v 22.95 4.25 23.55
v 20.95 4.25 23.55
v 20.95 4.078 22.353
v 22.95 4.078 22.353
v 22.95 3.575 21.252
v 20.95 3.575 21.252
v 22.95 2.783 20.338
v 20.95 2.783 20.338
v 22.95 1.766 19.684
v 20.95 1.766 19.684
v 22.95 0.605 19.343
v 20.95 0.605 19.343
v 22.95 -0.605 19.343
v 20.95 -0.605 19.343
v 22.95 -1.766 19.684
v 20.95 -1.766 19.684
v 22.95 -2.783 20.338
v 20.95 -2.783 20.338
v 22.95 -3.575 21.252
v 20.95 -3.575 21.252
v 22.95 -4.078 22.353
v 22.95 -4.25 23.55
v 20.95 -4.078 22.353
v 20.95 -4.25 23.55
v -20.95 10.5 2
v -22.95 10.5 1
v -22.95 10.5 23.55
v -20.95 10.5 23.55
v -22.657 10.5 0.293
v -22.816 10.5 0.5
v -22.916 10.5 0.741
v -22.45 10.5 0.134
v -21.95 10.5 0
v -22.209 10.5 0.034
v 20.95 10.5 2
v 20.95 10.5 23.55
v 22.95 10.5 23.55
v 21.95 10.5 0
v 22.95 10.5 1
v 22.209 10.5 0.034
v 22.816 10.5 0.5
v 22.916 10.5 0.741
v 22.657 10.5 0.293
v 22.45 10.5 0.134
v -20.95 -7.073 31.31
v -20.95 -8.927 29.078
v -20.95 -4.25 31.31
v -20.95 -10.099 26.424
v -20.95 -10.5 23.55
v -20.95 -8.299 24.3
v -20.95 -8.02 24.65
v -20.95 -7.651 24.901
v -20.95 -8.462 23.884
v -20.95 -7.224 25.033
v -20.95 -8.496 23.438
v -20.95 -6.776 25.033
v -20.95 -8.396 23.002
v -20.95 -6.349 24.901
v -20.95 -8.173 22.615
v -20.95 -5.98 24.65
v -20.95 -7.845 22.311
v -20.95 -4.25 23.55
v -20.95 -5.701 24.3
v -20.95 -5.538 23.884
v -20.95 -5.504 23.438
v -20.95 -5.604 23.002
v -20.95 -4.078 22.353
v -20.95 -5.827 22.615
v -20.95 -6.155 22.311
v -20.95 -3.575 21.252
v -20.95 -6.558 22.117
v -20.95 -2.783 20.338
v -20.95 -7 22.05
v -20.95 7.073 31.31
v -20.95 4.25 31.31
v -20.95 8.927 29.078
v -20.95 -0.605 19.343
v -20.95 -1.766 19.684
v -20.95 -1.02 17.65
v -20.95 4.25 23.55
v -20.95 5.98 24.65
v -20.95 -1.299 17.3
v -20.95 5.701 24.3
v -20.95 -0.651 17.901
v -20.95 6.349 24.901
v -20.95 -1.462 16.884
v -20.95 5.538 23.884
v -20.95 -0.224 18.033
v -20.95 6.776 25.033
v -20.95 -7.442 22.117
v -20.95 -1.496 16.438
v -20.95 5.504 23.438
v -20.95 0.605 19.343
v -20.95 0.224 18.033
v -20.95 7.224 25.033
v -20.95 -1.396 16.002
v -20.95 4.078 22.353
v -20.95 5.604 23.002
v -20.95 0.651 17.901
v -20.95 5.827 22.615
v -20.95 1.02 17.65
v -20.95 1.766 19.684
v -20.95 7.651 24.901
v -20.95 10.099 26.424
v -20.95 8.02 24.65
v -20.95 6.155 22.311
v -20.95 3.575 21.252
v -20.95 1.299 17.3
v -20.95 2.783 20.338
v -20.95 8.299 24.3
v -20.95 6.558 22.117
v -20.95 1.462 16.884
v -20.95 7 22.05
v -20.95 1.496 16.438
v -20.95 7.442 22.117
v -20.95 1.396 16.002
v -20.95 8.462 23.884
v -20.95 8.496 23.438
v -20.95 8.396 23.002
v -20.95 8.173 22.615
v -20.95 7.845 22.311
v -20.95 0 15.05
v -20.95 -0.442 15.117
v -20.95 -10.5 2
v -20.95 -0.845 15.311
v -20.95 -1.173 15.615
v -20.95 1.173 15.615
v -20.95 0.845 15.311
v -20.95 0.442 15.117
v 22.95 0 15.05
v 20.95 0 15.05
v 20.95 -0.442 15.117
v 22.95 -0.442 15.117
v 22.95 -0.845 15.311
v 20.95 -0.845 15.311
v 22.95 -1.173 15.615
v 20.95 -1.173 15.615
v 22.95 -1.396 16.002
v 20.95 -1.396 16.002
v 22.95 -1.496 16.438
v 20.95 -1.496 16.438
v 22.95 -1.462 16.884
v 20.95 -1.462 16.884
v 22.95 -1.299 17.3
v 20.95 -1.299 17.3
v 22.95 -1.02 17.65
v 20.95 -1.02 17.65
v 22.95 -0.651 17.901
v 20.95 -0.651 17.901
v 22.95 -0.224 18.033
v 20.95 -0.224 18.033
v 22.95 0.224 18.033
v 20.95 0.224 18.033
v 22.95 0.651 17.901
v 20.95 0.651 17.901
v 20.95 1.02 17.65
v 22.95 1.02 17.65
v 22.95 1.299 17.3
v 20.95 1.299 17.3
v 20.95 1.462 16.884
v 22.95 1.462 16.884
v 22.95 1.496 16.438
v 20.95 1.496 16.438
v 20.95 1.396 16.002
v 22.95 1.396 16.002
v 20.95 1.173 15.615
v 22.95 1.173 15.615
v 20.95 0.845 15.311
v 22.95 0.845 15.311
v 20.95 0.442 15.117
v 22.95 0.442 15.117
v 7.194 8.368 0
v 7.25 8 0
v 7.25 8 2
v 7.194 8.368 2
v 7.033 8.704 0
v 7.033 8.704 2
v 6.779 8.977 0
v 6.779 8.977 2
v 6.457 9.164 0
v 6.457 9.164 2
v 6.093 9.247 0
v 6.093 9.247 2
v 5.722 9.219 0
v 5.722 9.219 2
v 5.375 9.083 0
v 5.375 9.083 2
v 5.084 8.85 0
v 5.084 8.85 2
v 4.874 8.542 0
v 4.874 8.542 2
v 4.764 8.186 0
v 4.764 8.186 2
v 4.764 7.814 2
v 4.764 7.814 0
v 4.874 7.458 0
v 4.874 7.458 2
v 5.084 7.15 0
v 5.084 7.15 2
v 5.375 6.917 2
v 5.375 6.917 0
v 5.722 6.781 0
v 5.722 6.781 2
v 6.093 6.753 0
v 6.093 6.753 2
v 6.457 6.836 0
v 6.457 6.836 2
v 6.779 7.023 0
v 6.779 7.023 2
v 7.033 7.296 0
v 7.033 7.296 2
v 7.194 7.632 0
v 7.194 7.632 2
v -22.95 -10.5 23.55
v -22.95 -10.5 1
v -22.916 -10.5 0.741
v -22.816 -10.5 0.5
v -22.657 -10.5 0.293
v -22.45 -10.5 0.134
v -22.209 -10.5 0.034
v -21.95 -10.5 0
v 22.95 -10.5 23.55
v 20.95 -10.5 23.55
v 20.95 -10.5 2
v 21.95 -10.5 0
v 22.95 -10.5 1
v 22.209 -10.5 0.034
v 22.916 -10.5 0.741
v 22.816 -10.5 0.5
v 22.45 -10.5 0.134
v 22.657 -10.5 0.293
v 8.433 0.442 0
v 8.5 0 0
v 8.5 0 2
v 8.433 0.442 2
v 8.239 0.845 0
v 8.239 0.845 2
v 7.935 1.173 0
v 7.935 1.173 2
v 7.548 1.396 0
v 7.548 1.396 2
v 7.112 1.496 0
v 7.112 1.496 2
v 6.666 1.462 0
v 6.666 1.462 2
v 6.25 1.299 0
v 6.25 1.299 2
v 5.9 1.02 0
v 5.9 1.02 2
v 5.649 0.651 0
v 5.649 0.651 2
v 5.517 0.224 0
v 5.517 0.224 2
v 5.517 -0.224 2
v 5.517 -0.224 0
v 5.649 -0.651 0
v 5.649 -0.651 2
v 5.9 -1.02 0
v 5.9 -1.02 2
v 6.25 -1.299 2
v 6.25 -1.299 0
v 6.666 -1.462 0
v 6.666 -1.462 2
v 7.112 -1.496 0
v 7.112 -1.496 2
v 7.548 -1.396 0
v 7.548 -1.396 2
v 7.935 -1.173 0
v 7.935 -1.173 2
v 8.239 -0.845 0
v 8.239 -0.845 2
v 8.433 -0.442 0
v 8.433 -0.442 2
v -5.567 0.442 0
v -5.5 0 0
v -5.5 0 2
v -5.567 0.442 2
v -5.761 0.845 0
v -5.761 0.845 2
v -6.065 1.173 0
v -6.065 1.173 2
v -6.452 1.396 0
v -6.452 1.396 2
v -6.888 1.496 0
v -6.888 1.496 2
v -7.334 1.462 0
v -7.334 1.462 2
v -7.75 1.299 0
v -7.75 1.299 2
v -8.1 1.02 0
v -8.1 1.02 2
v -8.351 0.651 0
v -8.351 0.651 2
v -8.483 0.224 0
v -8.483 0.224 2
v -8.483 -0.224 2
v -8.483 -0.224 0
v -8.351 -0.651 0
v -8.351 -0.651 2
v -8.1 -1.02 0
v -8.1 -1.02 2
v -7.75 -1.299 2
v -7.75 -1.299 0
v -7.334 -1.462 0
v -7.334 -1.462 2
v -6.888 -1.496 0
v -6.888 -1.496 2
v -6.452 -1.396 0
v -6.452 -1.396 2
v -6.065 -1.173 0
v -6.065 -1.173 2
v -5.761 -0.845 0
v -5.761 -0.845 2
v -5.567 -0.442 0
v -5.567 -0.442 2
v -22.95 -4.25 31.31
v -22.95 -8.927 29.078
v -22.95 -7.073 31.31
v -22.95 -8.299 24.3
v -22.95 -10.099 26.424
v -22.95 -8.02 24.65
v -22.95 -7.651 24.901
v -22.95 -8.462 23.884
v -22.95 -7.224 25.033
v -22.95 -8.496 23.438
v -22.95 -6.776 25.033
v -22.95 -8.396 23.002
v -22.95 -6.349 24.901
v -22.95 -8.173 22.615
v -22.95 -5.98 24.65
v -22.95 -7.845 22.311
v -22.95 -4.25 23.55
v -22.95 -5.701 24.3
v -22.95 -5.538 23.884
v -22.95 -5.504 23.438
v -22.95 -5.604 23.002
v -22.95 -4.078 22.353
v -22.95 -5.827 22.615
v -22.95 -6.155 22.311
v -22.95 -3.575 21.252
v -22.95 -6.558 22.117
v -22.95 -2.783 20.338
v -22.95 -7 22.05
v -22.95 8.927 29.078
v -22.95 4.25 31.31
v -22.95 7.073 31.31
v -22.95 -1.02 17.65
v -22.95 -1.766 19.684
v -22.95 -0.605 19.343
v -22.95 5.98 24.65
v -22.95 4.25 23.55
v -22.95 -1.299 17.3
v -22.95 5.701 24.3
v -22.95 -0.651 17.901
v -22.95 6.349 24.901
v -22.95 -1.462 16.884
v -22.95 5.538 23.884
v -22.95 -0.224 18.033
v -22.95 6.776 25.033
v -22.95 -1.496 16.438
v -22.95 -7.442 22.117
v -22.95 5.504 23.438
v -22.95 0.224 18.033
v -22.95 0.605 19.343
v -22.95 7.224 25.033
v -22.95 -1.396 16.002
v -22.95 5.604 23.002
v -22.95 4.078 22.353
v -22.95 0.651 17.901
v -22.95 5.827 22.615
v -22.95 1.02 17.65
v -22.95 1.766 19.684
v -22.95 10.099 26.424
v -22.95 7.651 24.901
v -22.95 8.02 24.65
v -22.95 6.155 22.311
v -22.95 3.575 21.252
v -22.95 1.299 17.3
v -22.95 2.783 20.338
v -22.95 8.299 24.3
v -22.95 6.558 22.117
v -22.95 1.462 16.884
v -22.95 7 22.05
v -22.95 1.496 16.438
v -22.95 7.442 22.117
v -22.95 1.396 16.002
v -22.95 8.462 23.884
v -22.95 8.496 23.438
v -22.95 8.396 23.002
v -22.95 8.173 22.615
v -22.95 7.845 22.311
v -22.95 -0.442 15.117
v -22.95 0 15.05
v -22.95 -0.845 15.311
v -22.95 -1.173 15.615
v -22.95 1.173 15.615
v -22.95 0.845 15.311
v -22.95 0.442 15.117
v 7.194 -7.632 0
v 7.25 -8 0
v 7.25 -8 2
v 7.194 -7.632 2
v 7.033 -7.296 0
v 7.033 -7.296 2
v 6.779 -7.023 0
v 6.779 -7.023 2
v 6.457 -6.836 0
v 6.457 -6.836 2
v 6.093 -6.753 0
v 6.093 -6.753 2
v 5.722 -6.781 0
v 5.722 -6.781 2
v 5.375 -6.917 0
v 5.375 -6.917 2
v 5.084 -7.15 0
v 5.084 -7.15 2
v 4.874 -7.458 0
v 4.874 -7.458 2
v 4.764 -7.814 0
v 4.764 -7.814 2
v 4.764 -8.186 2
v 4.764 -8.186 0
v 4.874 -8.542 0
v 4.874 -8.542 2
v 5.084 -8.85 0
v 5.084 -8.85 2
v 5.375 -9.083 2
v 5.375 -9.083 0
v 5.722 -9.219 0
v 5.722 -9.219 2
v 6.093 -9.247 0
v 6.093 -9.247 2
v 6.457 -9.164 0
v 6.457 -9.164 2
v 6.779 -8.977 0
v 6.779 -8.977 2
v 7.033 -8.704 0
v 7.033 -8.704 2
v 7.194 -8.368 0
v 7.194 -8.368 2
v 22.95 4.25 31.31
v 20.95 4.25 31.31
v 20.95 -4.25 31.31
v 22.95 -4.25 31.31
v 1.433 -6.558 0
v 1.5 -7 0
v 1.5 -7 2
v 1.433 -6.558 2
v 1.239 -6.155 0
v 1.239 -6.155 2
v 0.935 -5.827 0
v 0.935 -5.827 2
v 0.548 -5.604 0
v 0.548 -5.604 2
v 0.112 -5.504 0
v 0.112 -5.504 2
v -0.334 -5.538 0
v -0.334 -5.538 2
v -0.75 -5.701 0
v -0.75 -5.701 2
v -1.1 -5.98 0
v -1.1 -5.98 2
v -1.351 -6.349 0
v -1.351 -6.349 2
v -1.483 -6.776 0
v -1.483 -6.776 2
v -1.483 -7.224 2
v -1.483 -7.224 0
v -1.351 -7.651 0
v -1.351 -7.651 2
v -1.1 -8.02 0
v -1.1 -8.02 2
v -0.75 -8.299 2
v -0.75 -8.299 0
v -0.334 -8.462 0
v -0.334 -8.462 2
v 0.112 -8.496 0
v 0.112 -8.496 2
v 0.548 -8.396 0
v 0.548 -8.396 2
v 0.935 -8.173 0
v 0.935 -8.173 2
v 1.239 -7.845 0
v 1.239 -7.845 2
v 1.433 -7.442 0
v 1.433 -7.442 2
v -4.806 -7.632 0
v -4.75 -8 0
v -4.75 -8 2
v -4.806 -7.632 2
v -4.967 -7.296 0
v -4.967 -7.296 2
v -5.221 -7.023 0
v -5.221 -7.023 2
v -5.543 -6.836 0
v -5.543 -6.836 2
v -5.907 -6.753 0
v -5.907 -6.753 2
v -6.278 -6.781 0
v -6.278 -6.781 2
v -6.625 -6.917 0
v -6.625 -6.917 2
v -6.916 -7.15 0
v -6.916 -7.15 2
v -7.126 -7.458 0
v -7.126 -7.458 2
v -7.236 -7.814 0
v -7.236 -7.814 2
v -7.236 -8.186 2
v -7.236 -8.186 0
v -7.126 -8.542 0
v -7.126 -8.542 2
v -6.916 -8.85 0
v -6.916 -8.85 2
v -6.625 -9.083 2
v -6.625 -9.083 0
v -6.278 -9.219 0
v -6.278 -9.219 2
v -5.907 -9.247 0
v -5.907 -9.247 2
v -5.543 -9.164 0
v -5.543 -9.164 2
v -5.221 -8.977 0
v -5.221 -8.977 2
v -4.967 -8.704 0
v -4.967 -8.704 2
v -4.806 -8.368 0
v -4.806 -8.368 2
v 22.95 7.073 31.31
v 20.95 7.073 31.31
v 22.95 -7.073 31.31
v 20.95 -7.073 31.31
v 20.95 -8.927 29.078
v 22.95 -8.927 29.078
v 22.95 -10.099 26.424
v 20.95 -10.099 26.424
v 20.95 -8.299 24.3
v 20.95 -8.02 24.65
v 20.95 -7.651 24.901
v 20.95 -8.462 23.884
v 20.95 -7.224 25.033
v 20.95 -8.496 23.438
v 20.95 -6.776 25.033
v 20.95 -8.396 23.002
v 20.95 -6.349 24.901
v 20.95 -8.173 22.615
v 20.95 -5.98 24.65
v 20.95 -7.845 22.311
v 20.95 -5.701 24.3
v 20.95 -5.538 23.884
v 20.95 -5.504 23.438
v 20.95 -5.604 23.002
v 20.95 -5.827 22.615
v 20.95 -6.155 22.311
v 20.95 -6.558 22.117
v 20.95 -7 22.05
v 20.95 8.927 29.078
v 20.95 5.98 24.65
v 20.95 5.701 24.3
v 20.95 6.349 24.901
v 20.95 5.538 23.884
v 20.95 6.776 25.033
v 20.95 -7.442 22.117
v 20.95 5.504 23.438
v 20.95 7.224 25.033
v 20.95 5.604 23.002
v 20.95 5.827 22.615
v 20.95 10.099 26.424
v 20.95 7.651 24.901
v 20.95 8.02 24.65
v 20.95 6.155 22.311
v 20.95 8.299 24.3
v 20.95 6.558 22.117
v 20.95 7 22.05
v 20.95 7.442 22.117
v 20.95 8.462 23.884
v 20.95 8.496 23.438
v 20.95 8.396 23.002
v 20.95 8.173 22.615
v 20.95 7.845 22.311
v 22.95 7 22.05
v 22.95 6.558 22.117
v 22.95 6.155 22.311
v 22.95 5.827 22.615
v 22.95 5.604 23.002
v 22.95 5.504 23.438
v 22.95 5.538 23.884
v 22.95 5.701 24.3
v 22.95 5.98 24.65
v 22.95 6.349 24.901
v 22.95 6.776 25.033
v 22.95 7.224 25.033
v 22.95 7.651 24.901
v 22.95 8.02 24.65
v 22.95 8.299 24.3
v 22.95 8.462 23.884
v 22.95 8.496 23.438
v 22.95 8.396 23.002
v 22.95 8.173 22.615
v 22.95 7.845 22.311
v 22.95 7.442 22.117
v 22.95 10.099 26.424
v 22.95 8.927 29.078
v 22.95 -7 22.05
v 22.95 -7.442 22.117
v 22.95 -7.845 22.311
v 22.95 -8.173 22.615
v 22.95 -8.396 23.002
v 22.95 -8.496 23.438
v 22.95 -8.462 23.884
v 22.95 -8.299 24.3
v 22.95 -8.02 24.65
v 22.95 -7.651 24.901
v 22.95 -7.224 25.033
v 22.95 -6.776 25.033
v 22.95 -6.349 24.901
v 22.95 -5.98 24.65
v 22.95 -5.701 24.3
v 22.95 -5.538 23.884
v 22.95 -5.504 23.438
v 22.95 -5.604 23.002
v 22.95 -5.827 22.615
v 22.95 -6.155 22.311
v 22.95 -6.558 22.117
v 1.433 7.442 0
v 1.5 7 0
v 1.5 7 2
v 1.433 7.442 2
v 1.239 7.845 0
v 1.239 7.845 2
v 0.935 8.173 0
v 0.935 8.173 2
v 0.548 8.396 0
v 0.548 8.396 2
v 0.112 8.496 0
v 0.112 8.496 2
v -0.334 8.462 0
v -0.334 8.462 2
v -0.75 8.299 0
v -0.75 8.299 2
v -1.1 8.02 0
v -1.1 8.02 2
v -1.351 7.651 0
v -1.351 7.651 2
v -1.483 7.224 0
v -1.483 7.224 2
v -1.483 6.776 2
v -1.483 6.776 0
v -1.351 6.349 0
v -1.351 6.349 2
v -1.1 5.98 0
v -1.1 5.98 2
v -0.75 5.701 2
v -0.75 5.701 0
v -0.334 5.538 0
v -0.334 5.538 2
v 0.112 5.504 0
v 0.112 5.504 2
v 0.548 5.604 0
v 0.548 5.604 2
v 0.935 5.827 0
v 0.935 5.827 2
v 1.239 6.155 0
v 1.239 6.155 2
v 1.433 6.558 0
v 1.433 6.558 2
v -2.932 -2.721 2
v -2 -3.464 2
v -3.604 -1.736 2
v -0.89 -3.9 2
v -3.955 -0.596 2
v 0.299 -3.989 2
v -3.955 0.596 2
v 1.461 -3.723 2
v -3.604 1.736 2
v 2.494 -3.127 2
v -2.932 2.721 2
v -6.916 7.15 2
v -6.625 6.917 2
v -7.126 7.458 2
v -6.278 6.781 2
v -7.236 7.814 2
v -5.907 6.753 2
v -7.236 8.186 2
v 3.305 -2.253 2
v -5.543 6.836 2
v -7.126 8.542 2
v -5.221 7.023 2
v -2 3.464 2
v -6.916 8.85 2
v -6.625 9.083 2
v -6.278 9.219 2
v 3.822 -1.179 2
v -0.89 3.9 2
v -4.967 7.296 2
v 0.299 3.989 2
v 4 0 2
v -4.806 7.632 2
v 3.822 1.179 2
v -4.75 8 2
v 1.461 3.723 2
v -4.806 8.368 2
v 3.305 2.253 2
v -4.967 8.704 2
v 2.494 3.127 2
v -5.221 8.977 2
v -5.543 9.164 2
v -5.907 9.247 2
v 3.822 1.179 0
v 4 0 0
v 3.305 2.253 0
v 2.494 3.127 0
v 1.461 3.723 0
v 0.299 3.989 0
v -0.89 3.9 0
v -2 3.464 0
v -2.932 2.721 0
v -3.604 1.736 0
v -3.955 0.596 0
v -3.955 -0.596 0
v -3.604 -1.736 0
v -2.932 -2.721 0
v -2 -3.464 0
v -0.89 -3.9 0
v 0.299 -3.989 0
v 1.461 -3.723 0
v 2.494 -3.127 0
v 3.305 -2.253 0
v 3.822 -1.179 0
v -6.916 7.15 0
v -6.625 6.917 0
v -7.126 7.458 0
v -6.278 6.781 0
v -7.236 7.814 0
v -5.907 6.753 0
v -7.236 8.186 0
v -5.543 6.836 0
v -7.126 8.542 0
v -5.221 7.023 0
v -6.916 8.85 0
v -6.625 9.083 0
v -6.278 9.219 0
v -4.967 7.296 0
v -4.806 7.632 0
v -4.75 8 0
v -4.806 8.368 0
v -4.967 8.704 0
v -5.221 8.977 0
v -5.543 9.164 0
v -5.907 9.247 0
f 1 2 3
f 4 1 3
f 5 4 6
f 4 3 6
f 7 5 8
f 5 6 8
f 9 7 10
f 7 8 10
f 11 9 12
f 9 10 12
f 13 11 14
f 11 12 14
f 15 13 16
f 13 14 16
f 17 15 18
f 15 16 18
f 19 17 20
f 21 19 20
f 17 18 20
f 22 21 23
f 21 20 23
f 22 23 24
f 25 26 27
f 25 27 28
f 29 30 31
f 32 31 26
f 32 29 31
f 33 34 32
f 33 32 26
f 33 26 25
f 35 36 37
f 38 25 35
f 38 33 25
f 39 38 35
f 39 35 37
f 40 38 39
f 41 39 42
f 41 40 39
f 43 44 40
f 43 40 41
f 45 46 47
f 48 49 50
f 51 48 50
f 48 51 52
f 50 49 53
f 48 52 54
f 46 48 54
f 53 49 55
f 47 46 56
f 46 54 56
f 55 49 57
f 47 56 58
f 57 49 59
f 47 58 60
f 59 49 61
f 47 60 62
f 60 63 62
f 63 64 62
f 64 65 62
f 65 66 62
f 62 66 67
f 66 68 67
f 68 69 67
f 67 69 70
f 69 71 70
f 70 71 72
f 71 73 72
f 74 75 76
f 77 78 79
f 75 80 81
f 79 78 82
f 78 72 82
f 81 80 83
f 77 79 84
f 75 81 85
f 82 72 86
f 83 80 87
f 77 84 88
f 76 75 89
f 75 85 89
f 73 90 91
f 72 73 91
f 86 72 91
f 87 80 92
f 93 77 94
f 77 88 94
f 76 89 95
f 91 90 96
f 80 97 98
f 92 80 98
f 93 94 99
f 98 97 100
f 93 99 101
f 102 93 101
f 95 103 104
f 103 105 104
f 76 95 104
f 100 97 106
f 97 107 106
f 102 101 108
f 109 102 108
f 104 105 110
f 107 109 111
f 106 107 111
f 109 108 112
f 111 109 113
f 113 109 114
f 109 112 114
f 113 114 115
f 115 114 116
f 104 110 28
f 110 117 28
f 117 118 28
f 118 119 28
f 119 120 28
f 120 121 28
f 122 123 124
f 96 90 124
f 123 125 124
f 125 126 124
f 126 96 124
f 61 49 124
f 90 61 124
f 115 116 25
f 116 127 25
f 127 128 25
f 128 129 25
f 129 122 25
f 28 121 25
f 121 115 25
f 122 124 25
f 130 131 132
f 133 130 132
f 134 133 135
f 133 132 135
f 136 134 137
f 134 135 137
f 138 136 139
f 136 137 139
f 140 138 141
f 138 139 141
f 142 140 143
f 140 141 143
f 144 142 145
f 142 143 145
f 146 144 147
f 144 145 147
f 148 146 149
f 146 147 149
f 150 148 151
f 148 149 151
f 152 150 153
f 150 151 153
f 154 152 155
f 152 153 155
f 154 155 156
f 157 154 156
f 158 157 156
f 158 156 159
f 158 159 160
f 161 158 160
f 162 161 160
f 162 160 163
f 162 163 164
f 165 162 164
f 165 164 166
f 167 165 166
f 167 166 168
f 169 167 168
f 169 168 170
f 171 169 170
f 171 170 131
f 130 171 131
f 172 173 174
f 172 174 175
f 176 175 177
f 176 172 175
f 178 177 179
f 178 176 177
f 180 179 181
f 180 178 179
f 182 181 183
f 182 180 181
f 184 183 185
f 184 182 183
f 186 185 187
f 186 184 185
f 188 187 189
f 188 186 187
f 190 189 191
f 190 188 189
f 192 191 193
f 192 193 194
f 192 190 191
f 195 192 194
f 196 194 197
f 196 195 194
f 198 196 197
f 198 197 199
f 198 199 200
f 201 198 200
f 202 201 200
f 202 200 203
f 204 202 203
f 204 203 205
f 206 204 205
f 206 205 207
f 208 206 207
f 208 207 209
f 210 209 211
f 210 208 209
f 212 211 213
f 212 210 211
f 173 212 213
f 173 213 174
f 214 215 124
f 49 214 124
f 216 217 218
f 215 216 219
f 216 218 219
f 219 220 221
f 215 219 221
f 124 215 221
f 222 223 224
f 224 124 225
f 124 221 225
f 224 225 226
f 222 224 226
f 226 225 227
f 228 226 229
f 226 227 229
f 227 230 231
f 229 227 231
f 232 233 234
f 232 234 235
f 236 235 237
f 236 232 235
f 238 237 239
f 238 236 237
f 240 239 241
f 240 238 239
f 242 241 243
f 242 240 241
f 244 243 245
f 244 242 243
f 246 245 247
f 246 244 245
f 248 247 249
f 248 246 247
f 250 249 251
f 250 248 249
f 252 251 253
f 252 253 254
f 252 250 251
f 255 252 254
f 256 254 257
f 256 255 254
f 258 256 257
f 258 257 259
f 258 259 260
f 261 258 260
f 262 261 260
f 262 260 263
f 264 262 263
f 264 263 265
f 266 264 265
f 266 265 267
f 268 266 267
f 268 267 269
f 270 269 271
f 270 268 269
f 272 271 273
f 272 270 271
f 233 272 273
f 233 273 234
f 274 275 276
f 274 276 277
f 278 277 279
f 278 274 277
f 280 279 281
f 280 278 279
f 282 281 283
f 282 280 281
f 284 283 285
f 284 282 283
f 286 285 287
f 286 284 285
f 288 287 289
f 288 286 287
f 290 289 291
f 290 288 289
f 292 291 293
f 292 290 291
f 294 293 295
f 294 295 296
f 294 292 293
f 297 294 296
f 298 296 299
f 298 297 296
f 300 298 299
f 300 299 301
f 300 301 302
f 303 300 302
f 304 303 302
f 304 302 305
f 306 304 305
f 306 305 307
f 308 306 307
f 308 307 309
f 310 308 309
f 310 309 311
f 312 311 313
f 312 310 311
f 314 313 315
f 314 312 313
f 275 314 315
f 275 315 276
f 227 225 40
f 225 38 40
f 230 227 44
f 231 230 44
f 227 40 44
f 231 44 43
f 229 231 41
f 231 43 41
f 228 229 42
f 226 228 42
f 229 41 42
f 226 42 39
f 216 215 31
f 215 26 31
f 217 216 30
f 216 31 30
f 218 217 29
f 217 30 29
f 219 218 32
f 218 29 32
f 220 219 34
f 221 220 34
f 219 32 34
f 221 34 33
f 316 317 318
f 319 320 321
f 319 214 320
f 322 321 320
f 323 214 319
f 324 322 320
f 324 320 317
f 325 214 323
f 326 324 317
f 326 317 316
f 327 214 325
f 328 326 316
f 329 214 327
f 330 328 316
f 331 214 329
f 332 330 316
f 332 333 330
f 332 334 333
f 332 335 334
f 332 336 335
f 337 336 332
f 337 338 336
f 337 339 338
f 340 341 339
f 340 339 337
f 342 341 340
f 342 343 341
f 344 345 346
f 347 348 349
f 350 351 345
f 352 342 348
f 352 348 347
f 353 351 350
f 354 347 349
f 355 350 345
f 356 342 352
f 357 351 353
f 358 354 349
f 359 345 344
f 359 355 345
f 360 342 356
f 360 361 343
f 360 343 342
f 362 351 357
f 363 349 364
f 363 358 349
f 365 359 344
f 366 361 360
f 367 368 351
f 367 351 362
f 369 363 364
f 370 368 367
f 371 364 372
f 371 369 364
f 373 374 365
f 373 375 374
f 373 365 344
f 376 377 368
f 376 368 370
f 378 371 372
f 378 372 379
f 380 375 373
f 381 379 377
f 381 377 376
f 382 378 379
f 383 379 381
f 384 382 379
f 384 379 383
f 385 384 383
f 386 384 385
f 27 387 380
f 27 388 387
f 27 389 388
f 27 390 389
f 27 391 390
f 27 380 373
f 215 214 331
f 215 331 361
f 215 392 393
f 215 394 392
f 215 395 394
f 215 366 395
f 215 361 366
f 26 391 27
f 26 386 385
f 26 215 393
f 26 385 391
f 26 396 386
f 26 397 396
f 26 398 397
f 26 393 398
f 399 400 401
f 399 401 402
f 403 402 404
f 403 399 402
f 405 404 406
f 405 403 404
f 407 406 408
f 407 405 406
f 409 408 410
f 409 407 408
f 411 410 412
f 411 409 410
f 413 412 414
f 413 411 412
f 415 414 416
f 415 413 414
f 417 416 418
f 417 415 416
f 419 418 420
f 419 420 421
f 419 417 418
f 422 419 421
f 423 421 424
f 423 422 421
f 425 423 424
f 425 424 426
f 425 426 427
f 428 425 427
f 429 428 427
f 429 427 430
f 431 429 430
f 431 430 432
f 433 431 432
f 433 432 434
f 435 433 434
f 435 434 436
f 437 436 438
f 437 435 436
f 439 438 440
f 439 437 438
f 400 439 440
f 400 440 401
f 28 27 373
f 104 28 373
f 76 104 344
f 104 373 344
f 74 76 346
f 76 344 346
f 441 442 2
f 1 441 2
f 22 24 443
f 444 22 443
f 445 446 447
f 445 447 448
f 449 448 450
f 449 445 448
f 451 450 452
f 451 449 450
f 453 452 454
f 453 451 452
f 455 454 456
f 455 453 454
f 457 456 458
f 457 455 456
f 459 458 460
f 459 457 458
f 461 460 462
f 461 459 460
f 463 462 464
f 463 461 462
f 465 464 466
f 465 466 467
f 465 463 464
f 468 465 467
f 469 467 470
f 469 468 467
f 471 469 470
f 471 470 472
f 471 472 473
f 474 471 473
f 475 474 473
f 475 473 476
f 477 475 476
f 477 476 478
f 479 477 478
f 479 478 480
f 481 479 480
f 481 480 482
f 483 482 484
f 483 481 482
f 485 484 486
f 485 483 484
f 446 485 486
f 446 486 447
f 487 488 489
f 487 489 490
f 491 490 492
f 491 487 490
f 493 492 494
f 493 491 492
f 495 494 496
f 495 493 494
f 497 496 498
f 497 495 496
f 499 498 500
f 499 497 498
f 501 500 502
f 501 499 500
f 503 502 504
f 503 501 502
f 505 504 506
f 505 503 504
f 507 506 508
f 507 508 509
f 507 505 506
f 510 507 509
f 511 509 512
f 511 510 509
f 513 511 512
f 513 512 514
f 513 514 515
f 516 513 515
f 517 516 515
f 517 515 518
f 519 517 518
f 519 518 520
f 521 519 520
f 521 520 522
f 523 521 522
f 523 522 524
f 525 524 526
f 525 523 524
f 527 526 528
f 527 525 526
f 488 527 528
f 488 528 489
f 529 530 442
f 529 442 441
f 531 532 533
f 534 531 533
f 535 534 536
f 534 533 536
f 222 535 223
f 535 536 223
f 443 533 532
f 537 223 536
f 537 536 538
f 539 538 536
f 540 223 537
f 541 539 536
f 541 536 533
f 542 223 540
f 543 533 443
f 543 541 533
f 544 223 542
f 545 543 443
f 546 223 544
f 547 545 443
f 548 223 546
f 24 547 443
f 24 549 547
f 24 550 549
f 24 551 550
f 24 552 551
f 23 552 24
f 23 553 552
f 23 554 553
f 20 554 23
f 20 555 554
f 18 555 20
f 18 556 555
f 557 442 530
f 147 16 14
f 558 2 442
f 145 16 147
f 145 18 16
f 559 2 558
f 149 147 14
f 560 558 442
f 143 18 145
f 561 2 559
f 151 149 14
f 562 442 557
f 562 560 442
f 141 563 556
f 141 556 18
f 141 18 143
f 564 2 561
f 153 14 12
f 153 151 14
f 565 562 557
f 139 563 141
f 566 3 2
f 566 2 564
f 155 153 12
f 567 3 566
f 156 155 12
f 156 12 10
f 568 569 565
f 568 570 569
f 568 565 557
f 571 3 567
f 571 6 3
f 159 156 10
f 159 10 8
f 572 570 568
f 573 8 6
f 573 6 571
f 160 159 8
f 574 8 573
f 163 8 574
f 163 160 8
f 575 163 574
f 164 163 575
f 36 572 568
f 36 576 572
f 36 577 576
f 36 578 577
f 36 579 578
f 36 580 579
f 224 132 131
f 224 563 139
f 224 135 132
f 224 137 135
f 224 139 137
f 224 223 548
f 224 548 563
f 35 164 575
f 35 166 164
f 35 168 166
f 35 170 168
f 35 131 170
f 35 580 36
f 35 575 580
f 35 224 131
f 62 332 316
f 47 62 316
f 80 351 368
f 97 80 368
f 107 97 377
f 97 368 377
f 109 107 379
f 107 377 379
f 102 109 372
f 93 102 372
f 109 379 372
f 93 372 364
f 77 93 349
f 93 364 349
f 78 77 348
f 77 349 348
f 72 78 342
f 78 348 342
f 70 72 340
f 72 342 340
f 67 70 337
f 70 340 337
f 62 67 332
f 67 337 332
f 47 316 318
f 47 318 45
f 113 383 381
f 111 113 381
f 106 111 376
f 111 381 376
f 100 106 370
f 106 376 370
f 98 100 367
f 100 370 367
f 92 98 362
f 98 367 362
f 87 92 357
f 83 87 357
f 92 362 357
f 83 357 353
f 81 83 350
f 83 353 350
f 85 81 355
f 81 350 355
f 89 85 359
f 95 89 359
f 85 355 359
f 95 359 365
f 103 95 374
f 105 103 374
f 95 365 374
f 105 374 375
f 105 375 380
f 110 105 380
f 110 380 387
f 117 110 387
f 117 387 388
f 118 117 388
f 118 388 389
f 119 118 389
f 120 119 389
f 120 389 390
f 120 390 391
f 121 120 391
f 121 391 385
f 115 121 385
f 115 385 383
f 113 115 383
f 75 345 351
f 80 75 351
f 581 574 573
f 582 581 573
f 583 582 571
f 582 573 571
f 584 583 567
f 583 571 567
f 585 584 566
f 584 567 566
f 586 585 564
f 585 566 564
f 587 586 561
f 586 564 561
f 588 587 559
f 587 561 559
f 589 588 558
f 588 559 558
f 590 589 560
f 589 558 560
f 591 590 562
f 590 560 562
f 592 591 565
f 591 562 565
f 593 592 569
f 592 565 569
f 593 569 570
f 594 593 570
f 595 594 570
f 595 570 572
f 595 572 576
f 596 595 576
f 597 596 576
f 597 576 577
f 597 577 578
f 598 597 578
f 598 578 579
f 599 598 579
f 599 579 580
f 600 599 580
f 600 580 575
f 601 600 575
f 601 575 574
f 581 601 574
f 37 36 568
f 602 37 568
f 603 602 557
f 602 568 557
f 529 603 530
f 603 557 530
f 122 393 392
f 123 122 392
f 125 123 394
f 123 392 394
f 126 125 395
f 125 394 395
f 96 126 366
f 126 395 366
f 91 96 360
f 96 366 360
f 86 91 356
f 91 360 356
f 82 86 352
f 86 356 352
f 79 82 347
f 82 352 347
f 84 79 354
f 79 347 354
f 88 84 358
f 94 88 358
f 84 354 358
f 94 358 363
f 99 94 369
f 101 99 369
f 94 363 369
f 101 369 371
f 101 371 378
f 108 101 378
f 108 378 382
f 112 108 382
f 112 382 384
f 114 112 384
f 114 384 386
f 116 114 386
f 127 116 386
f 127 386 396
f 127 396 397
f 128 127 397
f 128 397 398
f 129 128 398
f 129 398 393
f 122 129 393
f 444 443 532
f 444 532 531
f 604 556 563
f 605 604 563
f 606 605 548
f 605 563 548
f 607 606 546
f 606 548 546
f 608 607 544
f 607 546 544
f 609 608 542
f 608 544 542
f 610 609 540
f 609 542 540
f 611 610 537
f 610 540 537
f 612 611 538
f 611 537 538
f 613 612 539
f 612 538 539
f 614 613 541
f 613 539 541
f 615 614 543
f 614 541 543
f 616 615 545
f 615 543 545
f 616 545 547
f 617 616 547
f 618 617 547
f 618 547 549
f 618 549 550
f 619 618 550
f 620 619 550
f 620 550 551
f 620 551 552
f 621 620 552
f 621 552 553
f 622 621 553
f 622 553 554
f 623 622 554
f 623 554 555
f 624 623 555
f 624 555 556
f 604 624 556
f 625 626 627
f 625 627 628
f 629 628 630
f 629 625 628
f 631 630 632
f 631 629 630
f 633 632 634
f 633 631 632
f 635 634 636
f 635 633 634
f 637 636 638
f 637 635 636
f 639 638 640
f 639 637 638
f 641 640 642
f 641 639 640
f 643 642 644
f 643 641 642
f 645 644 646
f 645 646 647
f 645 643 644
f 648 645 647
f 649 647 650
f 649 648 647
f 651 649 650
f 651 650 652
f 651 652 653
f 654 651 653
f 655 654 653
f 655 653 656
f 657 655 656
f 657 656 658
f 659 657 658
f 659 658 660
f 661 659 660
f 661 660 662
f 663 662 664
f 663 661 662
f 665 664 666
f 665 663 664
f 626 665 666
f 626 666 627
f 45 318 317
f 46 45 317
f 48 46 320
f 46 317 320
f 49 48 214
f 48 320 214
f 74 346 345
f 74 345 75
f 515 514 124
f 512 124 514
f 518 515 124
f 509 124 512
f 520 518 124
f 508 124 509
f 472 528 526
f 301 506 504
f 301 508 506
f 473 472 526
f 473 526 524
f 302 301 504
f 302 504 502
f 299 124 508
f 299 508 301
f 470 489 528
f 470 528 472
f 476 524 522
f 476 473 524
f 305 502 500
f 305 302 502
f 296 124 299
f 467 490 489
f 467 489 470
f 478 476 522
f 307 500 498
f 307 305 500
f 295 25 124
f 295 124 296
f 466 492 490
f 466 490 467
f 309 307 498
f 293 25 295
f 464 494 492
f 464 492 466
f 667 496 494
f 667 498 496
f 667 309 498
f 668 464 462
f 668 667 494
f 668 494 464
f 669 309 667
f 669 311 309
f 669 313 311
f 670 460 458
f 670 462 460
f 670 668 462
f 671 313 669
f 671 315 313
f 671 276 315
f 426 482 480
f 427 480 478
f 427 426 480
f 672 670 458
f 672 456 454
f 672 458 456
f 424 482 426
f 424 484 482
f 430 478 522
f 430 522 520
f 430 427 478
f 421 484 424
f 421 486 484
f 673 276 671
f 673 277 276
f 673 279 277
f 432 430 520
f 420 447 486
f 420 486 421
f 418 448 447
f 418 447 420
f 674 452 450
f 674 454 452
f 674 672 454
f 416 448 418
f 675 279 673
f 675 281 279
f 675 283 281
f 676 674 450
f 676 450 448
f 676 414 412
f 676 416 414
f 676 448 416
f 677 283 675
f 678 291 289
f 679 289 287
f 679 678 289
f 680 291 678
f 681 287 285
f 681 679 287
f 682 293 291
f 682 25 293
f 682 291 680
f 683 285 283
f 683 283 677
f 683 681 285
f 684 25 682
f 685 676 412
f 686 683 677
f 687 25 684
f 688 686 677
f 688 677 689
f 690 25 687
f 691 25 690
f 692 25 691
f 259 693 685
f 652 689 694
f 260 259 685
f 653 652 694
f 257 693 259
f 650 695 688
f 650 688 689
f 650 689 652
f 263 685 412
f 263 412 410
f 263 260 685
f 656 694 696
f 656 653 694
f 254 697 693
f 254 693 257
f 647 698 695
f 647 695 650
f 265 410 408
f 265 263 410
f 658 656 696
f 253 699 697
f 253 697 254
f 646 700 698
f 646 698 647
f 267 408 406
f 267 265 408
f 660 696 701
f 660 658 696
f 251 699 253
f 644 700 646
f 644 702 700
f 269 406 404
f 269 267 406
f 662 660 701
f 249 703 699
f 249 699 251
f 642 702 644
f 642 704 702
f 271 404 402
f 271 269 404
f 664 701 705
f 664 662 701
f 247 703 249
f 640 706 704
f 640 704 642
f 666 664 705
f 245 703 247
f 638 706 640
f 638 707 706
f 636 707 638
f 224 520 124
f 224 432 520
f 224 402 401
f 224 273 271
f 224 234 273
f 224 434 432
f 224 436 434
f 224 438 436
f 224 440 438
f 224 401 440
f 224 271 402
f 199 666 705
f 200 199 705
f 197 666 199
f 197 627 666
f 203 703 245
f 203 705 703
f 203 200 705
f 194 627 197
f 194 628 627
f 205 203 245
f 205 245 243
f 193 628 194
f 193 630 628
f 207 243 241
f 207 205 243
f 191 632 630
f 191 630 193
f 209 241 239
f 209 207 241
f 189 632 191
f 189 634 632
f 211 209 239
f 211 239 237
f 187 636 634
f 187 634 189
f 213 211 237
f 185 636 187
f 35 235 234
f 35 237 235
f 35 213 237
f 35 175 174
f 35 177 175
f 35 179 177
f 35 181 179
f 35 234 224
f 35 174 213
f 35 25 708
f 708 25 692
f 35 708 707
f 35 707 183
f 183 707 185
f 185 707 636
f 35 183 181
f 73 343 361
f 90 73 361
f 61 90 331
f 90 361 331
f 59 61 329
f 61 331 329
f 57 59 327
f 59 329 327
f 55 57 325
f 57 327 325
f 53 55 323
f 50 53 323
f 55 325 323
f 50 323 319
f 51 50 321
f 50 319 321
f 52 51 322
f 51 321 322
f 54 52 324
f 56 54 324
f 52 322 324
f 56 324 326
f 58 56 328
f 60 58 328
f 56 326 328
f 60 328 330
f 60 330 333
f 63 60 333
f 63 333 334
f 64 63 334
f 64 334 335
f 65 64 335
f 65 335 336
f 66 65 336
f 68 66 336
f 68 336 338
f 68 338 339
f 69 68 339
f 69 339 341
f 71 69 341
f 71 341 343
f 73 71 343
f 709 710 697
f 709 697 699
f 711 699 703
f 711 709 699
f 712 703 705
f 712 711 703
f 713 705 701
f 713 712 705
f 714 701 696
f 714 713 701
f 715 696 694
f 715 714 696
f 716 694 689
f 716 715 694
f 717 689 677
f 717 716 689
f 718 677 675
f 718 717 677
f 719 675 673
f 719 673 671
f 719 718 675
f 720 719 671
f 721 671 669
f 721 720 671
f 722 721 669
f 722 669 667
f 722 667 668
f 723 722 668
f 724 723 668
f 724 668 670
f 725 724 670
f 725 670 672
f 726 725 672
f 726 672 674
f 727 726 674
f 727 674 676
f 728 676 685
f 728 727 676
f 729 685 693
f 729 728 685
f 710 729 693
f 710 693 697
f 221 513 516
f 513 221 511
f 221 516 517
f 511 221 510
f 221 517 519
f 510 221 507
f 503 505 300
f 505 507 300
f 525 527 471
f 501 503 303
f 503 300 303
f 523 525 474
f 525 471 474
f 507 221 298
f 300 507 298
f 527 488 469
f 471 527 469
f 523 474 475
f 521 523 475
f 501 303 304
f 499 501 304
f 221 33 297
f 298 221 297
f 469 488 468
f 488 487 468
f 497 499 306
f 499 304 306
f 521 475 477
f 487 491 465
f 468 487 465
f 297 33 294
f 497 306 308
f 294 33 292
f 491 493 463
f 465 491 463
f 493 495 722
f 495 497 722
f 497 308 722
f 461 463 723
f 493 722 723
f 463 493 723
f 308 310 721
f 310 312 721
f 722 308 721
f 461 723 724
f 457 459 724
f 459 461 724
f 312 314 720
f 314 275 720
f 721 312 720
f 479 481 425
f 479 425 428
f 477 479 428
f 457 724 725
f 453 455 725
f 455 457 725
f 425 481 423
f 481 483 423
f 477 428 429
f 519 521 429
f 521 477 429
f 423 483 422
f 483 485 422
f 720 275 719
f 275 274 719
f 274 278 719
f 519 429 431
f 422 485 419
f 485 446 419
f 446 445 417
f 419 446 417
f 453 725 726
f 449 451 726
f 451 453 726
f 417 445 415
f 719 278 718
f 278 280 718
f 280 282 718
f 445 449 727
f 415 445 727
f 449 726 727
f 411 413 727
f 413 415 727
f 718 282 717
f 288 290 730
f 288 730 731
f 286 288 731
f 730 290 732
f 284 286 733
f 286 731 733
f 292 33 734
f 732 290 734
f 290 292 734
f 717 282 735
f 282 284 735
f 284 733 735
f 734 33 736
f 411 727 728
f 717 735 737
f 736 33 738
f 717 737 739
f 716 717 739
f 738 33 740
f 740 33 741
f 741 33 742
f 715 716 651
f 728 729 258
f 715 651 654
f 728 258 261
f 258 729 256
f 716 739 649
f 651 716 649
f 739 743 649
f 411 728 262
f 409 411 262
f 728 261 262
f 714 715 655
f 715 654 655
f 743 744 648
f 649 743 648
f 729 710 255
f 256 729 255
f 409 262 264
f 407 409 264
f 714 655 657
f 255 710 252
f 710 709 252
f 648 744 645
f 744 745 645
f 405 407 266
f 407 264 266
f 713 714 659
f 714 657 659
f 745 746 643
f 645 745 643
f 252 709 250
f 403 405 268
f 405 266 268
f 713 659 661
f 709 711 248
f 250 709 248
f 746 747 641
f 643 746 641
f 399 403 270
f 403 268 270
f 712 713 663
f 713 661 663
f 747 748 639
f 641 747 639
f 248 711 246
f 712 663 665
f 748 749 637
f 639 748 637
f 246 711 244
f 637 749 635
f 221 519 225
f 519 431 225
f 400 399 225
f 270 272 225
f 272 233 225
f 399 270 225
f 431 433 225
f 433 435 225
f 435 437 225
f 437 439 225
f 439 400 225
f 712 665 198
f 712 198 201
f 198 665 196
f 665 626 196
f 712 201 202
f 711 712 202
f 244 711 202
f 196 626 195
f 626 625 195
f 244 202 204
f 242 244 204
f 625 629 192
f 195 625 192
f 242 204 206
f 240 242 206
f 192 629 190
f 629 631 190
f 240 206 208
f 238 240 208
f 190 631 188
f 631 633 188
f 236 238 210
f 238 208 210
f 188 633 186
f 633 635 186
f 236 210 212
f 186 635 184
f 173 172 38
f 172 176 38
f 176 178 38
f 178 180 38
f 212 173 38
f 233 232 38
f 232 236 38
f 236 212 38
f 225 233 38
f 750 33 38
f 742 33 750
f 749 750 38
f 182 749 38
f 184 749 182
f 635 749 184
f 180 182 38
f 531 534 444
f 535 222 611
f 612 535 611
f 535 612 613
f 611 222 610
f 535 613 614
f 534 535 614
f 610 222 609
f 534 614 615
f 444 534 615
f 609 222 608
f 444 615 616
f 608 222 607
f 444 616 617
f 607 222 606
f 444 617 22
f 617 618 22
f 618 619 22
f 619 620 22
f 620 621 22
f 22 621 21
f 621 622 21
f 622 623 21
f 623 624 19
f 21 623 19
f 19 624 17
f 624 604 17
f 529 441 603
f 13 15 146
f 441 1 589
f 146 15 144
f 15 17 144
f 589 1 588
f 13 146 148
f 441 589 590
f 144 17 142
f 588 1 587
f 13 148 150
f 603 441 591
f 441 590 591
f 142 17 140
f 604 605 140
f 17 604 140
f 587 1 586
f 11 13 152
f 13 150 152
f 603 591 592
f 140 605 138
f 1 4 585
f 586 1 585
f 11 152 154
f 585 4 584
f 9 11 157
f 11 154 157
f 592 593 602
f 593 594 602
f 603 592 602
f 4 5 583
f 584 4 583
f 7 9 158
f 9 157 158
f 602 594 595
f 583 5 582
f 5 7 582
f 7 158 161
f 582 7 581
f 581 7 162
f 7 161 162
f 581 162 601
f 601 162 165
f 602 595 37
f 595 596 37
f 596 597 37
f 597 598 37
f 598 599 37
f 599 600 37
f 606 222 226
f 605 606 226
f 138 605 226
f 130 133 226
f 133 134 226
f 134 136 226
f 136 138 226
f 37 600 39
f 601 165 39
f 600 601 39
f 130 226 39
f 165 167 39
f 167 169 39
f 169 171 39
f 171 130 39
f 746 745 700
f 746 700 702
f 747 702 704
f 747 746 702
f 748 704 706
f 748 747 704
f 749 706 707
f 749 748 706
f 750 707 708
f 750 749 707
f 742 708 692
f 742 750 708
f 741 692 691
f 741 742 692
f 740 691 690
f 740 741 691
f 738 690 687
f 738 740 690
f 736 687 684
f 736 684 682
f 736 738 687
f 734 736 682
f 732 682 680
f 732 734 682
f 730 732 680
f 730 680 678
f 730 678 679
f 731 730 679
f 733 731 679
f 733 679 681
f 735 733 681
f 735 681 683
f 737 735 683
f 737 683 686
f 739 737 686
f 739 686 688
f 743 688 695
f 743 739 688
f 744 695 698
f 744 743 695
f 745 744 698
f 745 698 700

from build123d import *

# Parameters (mm, degrees)
SKETCH1_W           = 41.9
SKETCH1_H           = 21
SKETCH1_R           = 1.25
SKETCH1_R_2         = 1.5
SKETCH1_R_3         = 4
BOSS_EXTRUDE1_DEPTH = 2
SKETCH1_3_W         = 2
SKETCH1_3_H         = 21
BOSS_EXTRUDE2_DEPTH = 31.31
SKETCH2_R           = 1.5
CUT_EXTRUDE1_DEPTH  = 50
FILLET1_R           = 1


with BuildPart() as part:
    # Sketch1 → Boss-Extrude1 (new body)
    with BuildSketch(Plane.XY):
        Rectangle(SKETCH1_W, SKETCH1_H)
        with Locations((-6, 8)):
            Circle(SKETCH1_R, mode=Mode.SUBTRACT)
        with Locations((-7, 0)):
            Circle(SKETCH1_R_2, mode=Mode.SUBTRACT)
        with Locations((-6, -8)):
            Circle(SKETCH1_R, mode=Mode.SUBTRACT)
        with Locations((0, -7)):
            Circle(SKETCH1_R_2, mode=Mode.SUBTRACT)
        with Locations((6, -8)):
            Circle(SKETCH1_R, mode=Mode.SUBTRACT)
        with Locations((7, 0)):
            Circle(SKETCH1_R_2, mode=Mode.SUBTRACT)
        with Locations((6, 8)):
            Circle(SKETCH1_R, mode=Mode.SUBTRACT)
        with Locations((0, 7)):
            Circle(SKETCH1_R_2, mode=Mode.SUBTRACT)
        Circle(SKETCH1_R_3, mode=Mode.SUBTRACT)
    extrude(amount=BOSS_EXTRUDE1_DEPTH)

    # Sketch1_3 → Boss-Extrude2 (add)
    with BuildSketch(Plane.XY):
        with Locations((-21.95, 0)):
            Rectangle(SKETCH1_3_W, SKETCH1_3_H)
        with Locations((21.95, 0)):
            Rectangle(SKETCH1_3_W, SKETCH1_3_H)
    extrude(amount=BOSS_EXTRUDE2_DEPTH)

    # Sketch2 → Cut-Extrude1 (cut)
    with BuildSketch(Plane.ZY.offset(22.95)):
        with Locations((16.55, 0)):
            Circle(SKETCH2_R)
        with BuildLine():
            Line((31.31, 10.5), (23.55, 10.5))
            ThreePointArc((23.55, 10.5), (27.791446457, 9.60521379), (31.31, 7.073358467))
            Line((31.31, 7.073358467), (31.31, 10.5))
        make_face()
        with BuildLine():
            ThreePointArc((31.31, -7.073358467), (27.791446457, -9.60521379), (23.55, -10.5))
            Line((23.55, -10.5), (31.31, -10.5))
            Line((31.31, -10.5), (31.31, -7.073358467))
        make_face()
        with Locations((23.55, 7)):
            Circle(SKETCH2_R)
        with Locations((23.55, -7)):
            Circle(SKETCH2_R)
        with BuildLine():
            Line((31.31, -4.25), (31.31, 4.25))
            Line((31.31, 4.25), (23.55, 4.25))
            ThreePointArc((23.55, 4.25), (19.3, 0), (23.55, -4.25))
            Line((23.55, -4.25), (31.31, -4.25))
        make_face()
    extrude(amount=-CUT_EXTRUDE1_DEPTH, mode=Mode.SUBTRACT)

    # Fillet1
    fillet1_edges = [part.edges().sort_by_distance(p)[0] for p in [
        (22.95, 0, 0),
        (-22.95, 0, 0),
    ]]
    fillet(fillet1_edges, radius=FILLET1_R)


solid = part.part
